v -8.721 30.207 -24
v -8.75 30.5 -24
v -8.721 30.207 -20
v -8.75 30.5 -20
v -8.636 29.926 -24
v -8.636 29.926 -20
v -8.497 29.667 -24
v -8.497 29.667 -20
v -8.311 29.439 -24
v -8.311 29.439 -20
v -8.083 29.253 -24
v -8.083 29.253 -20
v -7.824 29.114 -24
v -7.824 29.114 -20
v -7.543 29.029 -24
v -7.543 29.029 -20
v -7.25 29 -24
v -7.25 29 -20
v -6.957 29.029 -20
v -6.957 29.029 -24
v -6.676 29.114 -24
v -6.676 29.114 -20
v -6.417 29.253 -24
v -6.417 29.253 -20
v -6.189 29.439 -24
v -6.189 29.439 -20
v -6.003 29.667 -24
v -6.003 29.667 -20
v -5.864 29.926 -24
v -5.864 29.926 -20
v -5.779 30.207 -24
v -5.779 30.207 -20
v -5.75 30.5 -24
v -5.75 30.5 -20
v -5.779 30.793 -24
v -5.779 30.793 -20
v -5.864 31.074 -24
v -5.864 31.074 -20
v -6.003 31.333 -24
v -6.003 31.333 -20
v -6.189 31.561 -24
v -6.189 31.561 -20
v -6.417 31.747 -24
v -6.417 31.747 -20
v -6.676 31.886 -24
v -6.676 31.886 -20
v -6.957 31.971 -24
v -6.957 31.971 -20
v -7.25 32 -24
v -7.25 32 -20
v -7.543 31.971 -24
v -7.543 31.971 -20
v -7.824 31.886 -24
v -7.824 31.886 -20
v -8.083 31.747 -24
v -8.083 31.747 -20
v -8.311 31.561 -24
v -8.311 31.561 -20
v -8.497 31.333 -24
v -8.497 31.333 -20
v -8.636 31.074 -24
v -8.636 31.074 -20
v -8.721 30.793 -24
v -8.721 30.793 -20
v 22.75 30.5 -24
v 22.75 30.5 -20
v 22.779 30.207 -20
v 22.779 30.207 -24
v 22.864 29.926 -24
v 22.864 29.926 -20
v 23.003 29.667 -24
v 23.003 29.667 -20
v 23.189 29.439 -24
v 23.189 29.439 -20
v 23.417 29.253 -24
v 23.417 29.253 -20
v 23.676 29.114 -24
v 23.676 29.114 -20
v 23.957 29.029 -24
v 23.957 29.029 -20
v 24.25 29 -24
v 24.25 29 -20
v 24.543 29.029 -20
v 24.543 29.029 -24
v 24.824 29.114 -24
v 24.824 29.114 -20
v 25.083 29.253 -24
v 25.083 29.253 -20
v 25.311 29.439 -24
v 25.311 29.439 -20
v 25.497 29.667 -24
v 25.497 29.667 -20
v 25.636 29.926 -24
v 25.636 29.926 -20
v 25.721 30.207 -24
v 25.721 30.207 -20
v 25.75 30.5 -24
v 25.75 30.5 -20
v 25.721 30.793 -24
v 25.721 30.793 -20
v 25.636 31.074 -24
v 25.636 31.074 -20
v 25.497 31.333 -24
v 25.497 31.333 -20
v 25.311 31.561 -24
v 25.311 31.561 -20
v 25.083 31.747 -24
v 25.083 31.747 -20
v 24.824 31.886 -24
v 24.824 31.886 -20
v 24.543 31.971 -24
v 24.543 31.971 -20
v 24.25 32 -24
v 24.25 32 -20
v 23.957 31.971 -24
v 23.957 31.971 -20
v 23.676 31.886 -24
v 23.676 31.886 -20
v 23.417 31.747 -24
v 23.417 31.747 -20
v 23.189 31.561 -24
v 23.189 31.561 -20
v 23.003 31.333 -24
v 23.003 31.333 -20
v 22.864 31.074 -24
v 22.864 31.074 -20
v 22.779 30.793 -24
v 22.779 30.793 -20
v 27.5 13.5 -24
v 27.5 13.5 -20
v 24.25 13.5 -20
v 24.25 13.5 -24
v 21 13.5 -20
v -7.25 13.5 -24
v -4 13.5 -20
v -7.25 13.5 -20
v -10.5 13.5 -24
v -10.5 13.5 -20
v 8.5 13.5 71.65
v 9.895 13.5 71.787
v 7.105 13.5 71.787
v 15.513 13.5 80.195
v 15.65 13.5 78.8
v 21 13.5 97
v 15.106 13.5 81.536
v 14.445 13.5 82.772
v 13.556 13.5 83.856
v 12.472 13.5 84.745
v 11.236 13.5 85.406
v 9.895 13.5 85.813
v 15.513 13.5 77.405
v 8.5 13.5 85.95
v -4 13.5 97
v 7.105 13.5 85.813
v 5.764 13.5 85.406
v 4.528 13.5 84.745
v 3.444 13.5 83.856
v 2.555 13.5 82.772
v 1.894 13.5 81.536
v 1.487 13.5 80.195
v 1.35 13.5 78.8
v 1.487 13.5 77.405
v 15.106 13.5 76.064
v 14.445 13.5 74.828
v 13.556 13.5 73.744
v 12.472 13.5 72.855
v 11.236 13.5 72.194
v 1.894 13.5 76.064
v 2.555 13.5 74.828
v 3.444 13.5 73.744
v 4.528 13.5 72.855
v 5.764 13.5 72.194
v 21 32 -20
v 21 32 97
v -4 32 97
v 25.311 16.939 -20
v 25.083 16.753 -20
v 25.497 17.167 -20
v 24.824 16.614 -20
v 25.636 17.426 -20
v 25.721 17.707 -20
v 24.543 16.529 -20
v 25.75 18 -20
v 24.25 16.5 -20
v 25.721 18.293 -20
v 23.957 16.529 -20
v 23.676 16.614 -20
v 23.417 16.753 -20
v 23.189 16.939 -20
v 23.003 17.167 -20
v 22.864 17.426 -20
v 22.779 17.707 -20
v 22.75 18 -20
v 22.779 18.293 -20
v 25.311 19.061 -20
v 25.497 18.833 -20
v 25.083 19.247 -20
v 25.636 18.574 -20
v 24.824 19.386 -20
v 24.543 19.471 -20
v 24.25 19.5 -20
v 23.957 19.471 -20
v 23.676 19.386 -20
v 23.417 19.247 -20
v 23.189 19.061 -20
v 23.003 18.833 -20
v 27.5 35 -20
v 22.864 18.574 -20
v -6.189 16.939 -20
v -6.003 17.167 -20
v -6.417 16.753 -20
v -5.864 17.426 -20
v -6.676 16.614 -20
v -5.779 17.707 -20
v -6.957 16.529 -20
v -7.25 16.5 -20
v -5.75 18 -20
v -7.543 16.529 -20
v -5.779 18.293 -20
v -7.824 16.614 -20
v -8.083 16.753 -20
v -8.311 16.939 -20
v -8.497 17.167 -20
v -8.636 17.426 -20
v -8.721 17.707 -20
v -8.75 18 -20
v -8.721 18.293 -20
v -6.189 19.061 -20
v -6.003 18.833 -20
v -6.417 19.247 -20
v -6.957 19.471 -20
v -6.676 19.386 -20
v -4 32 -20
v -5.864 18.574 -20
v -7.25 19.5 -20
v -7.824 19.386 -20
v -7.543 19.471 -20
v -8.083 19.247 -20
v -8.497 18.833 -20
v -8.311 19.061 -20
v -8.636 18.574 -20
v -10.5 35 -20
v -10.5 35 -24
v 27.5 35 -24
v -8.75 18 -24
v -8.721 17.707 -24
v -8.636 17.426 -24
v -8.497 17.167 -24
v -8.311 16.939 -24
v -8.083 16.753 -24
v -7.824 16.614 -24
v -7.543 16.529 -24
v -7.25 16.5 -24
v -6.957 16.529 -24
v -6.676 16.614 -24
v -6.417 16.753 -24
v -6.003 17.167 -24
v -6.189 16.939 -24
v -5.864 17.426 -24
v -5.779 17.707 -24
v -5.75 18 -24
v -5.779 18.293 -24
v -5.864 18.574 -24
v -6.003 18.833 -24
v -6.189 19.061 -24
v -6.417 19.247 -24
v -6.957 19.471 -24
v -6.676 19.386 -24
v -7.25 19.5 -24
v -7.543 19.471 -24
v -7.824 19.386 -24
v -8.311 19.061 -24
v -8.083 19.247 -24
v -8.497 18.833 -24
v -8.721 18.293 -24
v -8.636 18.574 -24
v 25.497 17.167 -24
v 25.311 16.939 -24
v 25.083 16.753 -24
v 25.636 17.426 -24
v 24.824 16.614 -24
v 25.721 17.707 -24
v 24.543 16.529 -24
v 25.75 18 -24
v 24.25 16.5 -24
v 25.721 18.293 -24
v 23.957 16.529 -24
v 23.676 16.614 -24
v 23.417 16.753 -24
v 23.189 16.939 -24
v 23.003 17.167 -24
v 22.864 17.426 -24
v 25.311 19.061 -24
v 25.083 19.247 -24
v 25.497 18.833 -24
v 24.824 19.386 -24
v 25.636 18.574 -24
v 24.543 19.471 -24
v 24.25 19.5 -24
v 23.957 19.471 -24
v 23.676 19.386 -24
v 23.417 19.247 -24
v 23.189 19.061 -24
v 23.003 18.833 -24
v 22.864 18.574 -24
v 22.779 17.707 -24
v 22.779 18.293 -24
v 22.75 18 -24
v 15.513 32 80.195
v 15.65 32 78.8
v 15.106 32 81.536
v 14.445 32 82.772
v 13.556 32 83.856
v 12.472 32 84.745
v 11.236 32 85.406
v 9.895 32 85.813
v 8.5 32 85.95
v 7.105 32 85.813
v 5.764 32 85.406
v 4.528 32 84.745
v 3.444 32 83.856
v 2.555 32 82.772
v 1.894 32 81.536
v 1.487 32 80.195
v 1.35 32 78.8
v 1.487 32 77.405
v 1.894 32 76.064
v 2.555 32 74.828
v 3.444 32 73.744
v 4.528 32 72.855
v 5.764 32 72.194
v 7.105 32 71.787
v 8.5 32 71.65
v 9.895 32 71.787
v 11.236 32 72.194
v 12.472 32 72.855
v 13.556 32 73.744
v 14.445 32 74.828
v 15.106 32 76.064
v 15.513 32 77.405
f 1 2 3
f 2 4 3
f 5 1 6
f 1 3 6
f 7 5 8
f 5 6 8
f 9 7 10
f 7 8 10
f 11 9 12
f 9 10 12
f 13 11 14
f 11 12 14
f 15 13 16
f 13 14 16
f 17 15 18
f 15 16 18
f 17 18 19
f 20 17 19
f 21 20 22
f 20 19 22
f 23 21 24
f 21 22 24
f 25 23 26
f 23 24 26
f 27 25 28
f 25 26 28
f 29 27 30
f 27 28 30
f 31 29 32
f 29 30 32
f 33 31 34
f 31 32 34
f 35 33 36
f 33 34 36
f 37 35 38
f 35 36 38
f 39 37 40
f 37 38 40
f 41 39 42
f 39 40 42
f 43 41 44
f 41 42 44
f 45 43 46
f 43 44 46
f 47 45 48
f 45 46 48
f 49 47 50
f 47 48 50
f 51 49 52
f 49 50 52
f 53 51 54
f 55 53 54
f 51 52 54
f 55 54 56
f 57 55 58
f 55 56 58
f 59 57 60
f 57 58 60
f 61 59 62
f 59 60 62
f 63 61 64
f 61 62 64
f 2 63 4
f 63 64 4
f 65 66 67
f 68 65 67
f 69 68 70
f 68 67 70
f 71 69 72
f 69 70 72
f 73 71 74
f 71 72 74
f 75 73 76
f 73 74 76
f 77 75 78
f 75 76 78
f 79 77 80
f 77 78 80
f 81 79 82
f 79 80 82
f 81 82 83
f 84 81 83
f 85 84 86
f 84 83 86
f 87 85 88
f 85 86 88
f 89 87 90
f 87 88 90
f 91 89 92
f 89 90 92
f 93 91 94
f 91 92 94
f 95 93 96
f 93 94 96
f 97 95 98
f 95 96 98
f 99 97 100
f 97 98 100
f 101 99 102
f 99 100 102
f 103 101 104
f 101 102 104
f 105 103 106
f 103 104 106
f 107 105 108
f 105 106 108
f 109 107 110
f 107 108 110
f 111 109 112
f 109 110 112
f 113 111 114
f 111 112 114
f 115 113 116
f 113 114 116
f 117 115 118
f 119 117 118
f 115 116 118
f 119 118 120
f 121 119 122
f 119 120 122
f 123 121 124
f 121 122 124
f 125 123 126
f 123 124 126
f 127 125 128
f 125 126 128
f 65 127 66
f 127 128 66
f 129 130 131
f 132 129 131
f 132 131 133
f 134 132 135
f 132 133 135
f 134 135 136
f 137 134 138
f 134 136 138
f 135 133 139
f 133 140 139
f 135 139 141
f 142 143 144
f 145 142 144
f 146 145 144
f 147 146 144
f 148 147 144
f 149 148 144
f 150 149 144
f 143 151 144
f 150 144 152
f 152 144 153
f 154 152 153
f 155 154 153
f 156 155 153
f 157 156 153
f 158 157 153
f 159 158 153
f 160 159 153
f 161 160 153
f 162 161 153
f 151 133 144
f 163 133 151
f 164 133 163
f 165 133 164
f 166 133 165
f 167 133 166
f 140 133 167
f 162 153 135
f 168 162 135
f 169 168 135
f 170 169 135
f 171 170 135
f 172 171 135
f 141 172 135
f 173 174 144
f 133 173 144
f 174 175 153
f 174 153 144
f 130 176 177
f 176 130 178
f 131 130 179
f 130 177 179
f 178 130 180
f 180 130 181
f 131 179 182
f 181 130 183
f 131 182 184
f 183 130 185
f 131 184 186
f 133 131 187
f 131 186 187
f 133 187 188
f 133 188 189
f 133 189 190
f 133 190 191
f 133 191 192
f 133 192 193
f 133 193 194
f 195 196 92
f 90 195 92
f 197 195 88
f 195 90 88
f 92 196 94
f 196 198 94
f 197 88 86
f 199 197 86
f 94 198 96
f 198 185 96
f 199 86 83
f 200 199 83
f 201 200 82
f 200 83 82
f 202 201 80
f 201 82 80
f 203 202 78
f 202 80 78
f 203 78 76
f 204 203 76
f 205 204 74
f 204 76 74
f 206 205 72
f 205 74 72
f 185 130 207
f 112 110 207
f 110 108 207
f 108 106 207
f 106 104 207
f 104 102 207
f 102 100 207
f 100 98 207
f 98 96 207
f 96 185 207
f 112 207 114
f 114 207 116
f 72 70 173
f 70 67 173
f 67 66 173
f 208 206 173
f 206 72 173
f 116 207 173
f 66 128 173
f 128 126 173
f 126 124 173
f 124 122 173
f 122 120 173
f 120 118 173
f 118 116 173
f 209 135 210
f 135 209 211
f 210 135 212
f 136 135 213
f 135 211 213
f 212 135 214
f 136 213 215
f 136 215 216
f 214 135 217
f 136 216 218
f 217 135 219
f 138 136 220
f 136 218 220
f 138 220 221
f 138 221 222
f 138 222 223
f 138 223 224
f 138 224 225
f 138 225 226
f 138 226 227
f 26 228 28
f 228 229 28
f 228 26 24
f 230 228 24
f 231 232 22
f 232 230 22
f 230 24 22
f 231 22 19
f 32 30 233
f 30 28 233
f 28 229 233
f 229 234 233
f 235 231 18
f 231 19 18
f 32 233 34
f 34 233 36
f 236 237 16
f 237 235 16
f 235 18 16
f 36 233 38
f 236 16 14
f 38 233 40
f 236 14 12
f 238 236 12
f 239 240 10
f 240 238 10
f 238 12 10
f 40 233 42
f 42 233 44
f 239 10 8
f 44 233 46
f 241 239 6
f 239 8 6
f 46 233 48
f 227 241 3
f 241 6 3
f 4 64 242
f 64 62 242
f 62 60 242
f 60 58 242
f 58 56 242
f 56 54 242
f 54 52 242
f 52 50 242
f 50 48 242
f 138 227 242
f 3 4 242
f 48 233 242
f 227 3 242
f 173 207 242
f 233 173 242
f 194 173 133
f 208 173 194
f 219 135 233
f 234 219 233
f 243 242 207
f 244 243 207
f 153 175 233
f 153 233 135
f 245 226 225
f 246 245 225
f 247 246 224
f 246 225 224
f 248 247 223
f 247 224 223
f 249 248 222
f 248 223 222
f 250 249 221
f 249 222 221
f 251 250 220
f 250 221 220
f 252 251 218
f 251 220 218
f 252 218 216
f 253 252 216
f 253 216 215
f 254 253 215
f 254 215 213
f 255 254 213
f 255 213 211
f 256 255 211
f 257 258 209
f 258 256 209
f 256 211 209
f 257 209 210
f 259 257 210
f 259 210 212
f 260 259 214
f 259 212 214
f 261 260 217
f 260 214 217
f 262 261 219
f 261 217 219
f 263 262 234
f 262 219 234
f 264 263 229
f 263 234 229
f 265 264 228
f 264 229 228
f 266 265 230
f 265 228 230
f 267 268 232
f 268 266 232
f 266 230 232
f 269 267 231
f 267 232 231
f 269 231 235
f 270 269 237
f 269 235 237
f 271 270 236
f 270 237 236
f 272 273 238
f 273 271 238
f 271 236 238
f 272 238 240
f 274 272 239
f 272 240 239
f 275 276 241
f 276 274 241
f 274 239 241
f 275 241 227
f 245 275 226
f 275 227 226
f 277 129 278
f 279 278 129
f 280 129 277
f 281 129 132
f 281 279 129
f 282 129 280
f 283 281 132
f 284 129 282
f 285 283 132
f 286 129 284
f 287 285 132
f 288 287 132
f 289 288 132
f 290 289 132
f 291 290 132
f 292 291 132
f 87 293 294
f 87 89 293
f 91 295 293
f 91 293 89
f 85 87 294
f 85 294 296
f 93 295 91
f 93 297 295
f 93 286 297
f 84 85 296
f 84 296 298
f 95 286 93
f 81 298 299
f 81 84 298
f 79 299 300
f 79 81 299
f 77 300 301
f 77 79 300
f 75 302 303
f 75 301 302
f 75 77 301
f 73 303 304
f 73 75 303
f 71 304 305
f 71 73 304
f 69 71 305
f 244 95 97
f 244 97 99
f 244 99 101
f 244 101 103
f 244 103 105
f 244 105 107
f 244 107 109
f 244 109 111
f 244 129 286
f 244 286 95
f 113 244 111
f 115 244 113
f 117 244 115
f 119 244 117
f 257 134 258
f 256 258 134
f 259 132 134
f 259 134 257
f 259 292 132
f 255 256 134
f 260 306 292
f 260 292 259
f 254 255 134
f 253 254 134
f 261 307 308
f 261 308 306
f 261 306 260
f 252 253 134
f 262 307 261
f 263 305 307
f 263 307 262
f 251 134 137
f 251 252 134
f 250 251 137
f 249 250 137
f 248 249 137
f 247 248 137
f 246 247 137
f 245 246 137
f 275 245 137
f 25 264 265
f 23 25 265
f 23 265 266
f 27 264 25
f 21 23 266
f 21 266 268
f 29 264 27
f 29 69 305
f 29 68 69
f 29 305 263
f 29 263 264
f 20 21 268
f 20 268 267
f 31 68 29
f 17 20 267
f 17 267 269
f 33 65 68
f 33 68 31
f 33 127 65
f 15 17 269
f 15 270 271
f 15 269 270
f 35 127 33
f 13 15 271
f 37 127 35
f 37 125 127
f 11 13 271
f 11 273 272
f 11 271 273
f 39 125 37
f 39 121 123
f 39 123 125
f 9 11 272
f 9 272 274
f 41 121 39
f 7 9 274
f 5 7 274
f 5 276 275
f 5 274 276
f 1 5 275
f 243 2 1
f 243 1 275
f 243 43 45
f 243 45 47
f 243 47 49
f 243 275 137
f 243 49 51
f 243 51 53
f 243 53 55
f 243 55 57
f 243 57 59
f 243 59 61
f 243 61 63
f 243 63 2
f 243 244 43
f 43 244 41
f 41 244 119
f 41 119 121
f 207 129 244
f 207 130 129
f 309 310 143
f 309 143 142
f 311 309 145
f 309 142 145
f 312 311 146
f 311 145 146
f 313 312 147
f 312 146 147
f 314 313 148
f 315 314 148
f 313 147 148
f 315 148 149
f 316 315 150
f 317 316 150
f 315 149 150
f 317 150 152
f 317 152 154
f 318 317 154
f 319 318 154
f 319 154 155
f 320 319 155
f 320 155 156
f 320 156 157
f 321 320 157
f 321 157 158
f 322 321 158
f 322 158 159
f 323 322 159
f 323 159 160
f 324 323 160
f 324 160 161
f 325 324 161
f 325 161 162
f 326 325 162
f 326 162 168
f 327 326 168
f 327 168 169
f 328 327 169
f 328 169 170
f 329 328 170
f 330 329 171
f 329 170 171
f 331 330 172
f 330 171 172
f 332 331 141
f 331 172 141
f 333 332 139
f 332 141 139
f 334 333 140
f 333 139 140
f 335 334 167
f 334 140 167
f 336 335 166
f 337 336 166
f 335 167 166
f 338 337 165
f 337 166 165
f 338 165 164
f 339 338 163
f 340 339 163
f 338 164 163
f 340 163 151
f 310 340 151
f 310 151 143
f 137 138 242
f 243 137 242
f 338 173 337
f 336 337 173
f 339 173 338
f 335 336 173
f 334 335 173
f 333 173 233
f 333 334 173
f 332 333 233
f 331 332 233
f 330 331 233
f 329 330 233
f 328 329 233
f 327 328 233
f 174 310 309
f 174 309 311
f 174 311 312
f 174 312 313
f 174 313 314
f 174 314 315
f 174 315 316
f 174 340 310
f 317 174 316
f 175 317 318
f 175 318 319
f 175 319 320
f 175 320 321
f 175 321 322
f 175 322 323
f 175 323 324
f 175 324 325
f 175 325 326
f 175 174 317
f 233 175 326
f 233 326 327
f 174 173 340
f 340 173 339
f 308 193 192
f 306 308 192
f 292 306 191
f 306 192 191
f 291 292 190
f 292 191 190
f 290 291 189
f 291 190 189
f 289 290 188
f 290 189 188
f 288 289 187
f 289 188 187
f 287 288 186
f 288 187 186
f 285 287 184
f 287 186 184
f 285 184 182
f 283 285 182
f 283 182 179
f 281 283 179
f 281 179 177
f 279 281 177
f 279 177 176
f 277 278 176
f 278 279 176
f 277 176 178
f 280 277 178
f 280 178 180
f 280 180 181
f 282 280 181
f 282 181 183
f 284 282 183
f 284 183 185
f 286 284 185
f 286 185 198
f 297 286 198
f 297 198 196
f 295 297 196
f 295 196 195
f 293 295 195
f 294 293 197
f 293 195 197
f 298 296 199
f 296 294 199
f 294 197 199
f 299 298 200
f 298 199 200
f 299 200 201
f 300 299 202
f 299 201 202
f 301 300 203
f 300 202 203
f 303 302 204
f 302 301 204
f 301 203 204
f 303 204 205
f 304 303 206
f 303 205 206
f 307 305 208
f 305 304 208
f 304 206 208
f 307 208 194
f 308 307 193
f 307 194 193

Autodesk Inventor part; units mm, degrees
ref_plane "YZ Plane" through (0, 0, 0) normal (1, 0, 0) x (0, 1, 0)
ref_plane "XZ Plane" through (0, 0, 0) normal (0, 1, 0) x (-1, 0, 0)
ref_plane "XY Plane" through (0, 0, 0) normal (0, 0, 1) x (1, 0, 0)
sketch "Sketch14" plane through (0, 0, 0) normal (0, 0, 1) x (1, 0, 0)
  line L0 (0, 0) -> (17, 0)
  line L1 (17, 0) -> (17, 30)
  line L2 (17, 30) -> (0, 30)
  line L3 (0, 30) -> (0, 0)
  line L4 (-6, 36) -> (23, 36)
  line L5 (23, 36) -> (23, -6)
  line L6 (23, -6) -> (-6, -6)
  line L7 (-6, -6) -> (-6, 36)
  dimension "d55" = 17
  dimension "d56" = 30
  dimension "d57" = 6
extrude "Extrusion12" add sketch "Sketch14" against normal blind 3 contours L3 L2 L1 L0 | L4 L5 L6 L7
extrude "Extrusion13" add sketch "Sketch14" along normal blind 90 contours L3 L2 L1 L0
sketch "Sketch15" plane through (0, 0, 0) normal (0, -1, 0) x (1, 0, 0)
  line L0 (0, 0) -> (0, 90) projected
  line L1 (0, 90) -> (17.1111, 90)
  line L2 (0, 90) -> (17, 90)
  line L3 (17, 90) -> (17, 97)
  line L4 (17, 97) -> (0, 97)
  line L5 (0, 97) -> (0, 90)
  line L6 (17, 90) -> (0, 90) projected
  circle A0 centre (8.5, 78.8) radius 7.15
  line L7 (17, 0) -> (17, 90) projected
  line L8 (0, 97) -> (17, 97)
  line L9 (17, 97) -> (17, 42)
  line L10 (17, 42) -> (0, 42)
  line L11 (0, 42) -> (0, 97)
  dimension "d67" = 7
  dimension "d73" = 14.3
  dimension "d79" = 55
extrude "Extrusion14" cut sketch "Sketch15" against normal blind 90 contours A0
extrude "Extrusion15" cut sketch "Sketch15" against normal blind 15.5 contours L0 L1 L7 L10
extrude "Extrusion17" add sketch "Sketch15" against normal blind 30 contours L5 L4 L3 L1
sketch "Sketch16" plane through (0, 0, 0) normal (0, -1, 0) x (1, 0, 0)
  line L0 (0, 0) -> (0, 97) projected
  line L1 (17, 0) -> (17, 97) projected
  line L2 (0, 97) -> (17, 97)
  line L3 (17, 97) -> (17, 90)
  line L4 (17, 90) -> (0, 90)
  line L5 (0, 90) -> (0, 97)
  dimension "d86" = 7
extrude "Extrusion18" cut sketch "Sketch15" against normal blind 15.5 contours L5 L4 L3 L1
sketch "Sketch21" plane through (0, 15.5, 97) normal (0, 0, 1) x (1, 0, 0)
  line L0 (0, 14.5) -> (17, 14.5) projected
  line L1 (0, 14.5) -> (0, 16.5)
  line L2 (0, 16.5) -> (-2, 16.5)
  line L3 (17, 0) -> (19, 0)
  line L4 (19, 0) -> (19, -2)
  line L5 (-2, 16.5) -> (19, 16.5)
  line L6 (19, 16.5) -> (19, -2)
  line L7 (19, -2) -> (-2, -2)
  line L8 (-2, -2) -> (-2, 16.5)
  point P0 (0, -15.5)
  dimension "d109" = 2
  dimension "d110" = 2
  dimension "d111" = 2
  dimension "d112" = 2
extrude "Extrusion24" add sketch "Sketch21" against normal blind 97.9375
sketch "Sketch22" plane through (0, 0, 42) normal (0, 0, 1) x (1, 0, 0)
  line L0 (17, 13.5) -> (0, 13.5) projected
  line L1 (0, 13.5) -> (17.0001, 13.5)
  line L2 (17.0001, 13.5) -> (17.0001, 0)
  line L3 (17.0001, 0) -> (0, 0)
  line L4 (0, 0) -> (0, 13.5)
extrude "Extrusion25" cut sketch "Sketch22" against normal blind 42
extrude "Extrusion26" cut sketch "Sketch15" against normal blind 97.9375 contours A0
sketch "Sketch23" plane through (0, 0, -3) normal (0, 0, -1) x (-1, 0, 0)
  line L0 (-28.2805, -15.4048) -> (9.4268, -15.4048)
  line L1 (9.4268, -15.4048) -> (9.4268, 47.594)
  line L2 (9.4268, 47.594) -> (-28.2805, 47.594)
  line L3 (-28.2805, 47.594) -> (-28.2805, -15.4048)
  point P0 (0, 0)
extrude "Extrusion27" cut sketch "Sketch23" against normal blind 43
sketch "Sketch24" plane through (-2, 32, 97) normal (0, 1, 0) x (1, 0, 0)
  point P0 (2, 97)
sketch "Sketch25" plane through (-2, 32, 97) normal (0, 1, 0) x (1, 0, 0)
  point P0 (2, 97)
sketch "Sketch26" plane through (-2, 32, 97) normal (0, 1, 0) x (1, 0, 0)
  point P0 (2, 97)
sketch "Sketch27" plane through (-2, 32, 97) normal (0, 1, 0) x (1, 0, 0)
  point P0 (2, 97)
sketch "Sketch28" plane through (-2, 32, 97) normal (0, 1, 0) x (1, 0, 0)
  point P0 (2, 97)
sketch "Sketch29" plane through (-2, 32, 97) normal (0, 1, 0) x (1, 0, 0)
  point P0 (2, 97)
sketch "Sketch30" plane through (-2, 32, 97) normal (0, 1, 0) x (1, 0, 0)
  point P0 (2, 97)
  point P1 (21, 0)
  point P2 (0, 57)
sketch "Sketch31" plane through (0, 0, 40) normal (0, 0, -1) x (-1, 0, 0)
  line L0 (2, 13.5) -> (-19, 13.5) projected
  line L1 (-19, 32) -> (2, 32) projected
  line L2 (2, 13.5) -> (-19, 13.5)
  line L3 (-19, 13.5) -> (-19, 32)
  line L4 (-19, 32) -> (2, 32)
  line L5 (2, 32) -> (2, 13.5)
  point P0 (0, 0)
  point P1 (2, 32)
extrude "Extrusion28" add sketch "Sketch31" along normal blind 43
sketch "Sketch33" plane through (-2, 13.5, 97) normal (0, 0, 1) x (1, 0, 0)
  line L0 (0, 0) -> (21, 0) projected
  line L1 (0, 0) -> (-2, 0)
  line L2 (-2, 0) -> (-2, 18.5)
  line L3 (-2, 18.5) -> (0, 18.5)
  line L4 (0, 18.5) -> (0, 0)
  line L5 (21, 0) -> (21, 18.5) projected
  line L6 (21, 0) -> (23, 0)
  line L7 (23, 0) -> (23, 18.5)
  line L8 (23, 18.5) -> (21, 18.5)
  line L9 (21, 18.5) -> (21, 0)
  point P0 (2, -13.5)
  dimension "d123" = 2
  dimension "d124" = 2
extrude "Extrusion29" add sketch "Sketch33" against normal blind 100
sketch "Sketch37" plane through (0, 0, -3) normal (0, 0, -1) x (-1, 0, 0)
  line L0 (-21, 32) -> (-21, 13.5) projected
  line L1 (4, 13.5) -> (-21, 13.5) projected
  line L2 (-21, 32) -> (4, 32)
  line L3 (4, 32) -> (4, 13.5)
  line L4 (4, 13.5) -> (-21, 13.5)
  line L5 (-21, 13.5) -> (-21, 32)
  point P0 (0, 0)
extrude "Extrusion30" add sketch "Sketch37" along normal blind 17
sketch "Sketch38" plane through (0, 0, -20) normal (0, 0, -1) x (-1, 0, 0)
  line L0 (4, 13.5) -> (-21, 13.5) projected
  line L1 (4, 13.5) -> (10.5, 13.5)
  line L2 (10.5, 13.5) -> (10.5, 32)
  line L3 (10.5, 32) -> (4, 32)
  line L4 (4, 32) -> (4, 13.5)
  line L5 (-21, 13.5) -> (-21, 32) projected
  line L6 (-21, 13.5) -> (-27.5, 13.5)
  line L7 (-27.5, 13.5) -> (-27.5, 32)
  line L8 (-27.5, 32) -> (-21, 32)
  line L9 (-21, 32) -> (-21, 13.5)
  line L10 (-27.5, 32) -> (10.5, 32)
  line L11 (10.5, 32) -> (10.5, 36)
  line L12 (10.5, 36) -> (-27.5, 36)
  line L13 (-27.5, 36) -> (-27.5, 32)
  line L14 (-24.25, 13.5) -> (-24.25, 18)
  line L15 (-24.25, 36) -> (-24.25, 30.5)
  line L16 (7.25, 36) -> (7.25, 30.5)
  line L17 (7.25, 13.5) -> (7.25, 18)
  circle A0 centre (-24.25, 30.5) radius 1.5
  circle A1 centre (-24.25, 18) radius 1.5
  circle A2 centre (7.25, 18) radius 1.5
  circle A3 centre (7.25, 30.5) radius 1.5
  line L18 (-24.25, 31.5) -> (-24.25, 30.5)
  line L19 (7.25, 31.5) -> (7.25, 30.5)
  line L20 (-27.5, 36) -> (10.5, 36)
  line L21 (10.5, 36) -> (10.5, 35)
  line L22 (10.5, 35) -> (-27.5, 35)
  line L23 (-27.5, 35) -> (-27.5, 36)
  line L24 (7.25, 35) -> (10.5, 35)
  line L25 (10.5, 35) -> (10.5, 32)
  line L26 (10.5, 32) -> (7.25, 32)
  line L27 (7.25, 32) -> (7.25, 35)
  point P0 (0, 0)
  point P1 (7.25, 32)
  point P2 (7.25, 32)
  point P3 (7.25, 32)
  point P4 (7.25, 35)
  dimension "d132" = 4.5
  dimension "d135" = 4.5
  dimension "d137" = 3
  dimension "d138" = 3
  dimension "d142" = 1
  dimension "d143" = 1
extrude "Extrusion31" add sketch "Sketch38" along normal blind 4 contours L4 L3 L2 L1 | L0 L5 L10 L4 | L6 L7 L8 L5 | L10 L8 L15 L22 L16 L3 | L16 L22 L11 L3 | L8 L13 L22 L15
properties part number "ramie_2"
